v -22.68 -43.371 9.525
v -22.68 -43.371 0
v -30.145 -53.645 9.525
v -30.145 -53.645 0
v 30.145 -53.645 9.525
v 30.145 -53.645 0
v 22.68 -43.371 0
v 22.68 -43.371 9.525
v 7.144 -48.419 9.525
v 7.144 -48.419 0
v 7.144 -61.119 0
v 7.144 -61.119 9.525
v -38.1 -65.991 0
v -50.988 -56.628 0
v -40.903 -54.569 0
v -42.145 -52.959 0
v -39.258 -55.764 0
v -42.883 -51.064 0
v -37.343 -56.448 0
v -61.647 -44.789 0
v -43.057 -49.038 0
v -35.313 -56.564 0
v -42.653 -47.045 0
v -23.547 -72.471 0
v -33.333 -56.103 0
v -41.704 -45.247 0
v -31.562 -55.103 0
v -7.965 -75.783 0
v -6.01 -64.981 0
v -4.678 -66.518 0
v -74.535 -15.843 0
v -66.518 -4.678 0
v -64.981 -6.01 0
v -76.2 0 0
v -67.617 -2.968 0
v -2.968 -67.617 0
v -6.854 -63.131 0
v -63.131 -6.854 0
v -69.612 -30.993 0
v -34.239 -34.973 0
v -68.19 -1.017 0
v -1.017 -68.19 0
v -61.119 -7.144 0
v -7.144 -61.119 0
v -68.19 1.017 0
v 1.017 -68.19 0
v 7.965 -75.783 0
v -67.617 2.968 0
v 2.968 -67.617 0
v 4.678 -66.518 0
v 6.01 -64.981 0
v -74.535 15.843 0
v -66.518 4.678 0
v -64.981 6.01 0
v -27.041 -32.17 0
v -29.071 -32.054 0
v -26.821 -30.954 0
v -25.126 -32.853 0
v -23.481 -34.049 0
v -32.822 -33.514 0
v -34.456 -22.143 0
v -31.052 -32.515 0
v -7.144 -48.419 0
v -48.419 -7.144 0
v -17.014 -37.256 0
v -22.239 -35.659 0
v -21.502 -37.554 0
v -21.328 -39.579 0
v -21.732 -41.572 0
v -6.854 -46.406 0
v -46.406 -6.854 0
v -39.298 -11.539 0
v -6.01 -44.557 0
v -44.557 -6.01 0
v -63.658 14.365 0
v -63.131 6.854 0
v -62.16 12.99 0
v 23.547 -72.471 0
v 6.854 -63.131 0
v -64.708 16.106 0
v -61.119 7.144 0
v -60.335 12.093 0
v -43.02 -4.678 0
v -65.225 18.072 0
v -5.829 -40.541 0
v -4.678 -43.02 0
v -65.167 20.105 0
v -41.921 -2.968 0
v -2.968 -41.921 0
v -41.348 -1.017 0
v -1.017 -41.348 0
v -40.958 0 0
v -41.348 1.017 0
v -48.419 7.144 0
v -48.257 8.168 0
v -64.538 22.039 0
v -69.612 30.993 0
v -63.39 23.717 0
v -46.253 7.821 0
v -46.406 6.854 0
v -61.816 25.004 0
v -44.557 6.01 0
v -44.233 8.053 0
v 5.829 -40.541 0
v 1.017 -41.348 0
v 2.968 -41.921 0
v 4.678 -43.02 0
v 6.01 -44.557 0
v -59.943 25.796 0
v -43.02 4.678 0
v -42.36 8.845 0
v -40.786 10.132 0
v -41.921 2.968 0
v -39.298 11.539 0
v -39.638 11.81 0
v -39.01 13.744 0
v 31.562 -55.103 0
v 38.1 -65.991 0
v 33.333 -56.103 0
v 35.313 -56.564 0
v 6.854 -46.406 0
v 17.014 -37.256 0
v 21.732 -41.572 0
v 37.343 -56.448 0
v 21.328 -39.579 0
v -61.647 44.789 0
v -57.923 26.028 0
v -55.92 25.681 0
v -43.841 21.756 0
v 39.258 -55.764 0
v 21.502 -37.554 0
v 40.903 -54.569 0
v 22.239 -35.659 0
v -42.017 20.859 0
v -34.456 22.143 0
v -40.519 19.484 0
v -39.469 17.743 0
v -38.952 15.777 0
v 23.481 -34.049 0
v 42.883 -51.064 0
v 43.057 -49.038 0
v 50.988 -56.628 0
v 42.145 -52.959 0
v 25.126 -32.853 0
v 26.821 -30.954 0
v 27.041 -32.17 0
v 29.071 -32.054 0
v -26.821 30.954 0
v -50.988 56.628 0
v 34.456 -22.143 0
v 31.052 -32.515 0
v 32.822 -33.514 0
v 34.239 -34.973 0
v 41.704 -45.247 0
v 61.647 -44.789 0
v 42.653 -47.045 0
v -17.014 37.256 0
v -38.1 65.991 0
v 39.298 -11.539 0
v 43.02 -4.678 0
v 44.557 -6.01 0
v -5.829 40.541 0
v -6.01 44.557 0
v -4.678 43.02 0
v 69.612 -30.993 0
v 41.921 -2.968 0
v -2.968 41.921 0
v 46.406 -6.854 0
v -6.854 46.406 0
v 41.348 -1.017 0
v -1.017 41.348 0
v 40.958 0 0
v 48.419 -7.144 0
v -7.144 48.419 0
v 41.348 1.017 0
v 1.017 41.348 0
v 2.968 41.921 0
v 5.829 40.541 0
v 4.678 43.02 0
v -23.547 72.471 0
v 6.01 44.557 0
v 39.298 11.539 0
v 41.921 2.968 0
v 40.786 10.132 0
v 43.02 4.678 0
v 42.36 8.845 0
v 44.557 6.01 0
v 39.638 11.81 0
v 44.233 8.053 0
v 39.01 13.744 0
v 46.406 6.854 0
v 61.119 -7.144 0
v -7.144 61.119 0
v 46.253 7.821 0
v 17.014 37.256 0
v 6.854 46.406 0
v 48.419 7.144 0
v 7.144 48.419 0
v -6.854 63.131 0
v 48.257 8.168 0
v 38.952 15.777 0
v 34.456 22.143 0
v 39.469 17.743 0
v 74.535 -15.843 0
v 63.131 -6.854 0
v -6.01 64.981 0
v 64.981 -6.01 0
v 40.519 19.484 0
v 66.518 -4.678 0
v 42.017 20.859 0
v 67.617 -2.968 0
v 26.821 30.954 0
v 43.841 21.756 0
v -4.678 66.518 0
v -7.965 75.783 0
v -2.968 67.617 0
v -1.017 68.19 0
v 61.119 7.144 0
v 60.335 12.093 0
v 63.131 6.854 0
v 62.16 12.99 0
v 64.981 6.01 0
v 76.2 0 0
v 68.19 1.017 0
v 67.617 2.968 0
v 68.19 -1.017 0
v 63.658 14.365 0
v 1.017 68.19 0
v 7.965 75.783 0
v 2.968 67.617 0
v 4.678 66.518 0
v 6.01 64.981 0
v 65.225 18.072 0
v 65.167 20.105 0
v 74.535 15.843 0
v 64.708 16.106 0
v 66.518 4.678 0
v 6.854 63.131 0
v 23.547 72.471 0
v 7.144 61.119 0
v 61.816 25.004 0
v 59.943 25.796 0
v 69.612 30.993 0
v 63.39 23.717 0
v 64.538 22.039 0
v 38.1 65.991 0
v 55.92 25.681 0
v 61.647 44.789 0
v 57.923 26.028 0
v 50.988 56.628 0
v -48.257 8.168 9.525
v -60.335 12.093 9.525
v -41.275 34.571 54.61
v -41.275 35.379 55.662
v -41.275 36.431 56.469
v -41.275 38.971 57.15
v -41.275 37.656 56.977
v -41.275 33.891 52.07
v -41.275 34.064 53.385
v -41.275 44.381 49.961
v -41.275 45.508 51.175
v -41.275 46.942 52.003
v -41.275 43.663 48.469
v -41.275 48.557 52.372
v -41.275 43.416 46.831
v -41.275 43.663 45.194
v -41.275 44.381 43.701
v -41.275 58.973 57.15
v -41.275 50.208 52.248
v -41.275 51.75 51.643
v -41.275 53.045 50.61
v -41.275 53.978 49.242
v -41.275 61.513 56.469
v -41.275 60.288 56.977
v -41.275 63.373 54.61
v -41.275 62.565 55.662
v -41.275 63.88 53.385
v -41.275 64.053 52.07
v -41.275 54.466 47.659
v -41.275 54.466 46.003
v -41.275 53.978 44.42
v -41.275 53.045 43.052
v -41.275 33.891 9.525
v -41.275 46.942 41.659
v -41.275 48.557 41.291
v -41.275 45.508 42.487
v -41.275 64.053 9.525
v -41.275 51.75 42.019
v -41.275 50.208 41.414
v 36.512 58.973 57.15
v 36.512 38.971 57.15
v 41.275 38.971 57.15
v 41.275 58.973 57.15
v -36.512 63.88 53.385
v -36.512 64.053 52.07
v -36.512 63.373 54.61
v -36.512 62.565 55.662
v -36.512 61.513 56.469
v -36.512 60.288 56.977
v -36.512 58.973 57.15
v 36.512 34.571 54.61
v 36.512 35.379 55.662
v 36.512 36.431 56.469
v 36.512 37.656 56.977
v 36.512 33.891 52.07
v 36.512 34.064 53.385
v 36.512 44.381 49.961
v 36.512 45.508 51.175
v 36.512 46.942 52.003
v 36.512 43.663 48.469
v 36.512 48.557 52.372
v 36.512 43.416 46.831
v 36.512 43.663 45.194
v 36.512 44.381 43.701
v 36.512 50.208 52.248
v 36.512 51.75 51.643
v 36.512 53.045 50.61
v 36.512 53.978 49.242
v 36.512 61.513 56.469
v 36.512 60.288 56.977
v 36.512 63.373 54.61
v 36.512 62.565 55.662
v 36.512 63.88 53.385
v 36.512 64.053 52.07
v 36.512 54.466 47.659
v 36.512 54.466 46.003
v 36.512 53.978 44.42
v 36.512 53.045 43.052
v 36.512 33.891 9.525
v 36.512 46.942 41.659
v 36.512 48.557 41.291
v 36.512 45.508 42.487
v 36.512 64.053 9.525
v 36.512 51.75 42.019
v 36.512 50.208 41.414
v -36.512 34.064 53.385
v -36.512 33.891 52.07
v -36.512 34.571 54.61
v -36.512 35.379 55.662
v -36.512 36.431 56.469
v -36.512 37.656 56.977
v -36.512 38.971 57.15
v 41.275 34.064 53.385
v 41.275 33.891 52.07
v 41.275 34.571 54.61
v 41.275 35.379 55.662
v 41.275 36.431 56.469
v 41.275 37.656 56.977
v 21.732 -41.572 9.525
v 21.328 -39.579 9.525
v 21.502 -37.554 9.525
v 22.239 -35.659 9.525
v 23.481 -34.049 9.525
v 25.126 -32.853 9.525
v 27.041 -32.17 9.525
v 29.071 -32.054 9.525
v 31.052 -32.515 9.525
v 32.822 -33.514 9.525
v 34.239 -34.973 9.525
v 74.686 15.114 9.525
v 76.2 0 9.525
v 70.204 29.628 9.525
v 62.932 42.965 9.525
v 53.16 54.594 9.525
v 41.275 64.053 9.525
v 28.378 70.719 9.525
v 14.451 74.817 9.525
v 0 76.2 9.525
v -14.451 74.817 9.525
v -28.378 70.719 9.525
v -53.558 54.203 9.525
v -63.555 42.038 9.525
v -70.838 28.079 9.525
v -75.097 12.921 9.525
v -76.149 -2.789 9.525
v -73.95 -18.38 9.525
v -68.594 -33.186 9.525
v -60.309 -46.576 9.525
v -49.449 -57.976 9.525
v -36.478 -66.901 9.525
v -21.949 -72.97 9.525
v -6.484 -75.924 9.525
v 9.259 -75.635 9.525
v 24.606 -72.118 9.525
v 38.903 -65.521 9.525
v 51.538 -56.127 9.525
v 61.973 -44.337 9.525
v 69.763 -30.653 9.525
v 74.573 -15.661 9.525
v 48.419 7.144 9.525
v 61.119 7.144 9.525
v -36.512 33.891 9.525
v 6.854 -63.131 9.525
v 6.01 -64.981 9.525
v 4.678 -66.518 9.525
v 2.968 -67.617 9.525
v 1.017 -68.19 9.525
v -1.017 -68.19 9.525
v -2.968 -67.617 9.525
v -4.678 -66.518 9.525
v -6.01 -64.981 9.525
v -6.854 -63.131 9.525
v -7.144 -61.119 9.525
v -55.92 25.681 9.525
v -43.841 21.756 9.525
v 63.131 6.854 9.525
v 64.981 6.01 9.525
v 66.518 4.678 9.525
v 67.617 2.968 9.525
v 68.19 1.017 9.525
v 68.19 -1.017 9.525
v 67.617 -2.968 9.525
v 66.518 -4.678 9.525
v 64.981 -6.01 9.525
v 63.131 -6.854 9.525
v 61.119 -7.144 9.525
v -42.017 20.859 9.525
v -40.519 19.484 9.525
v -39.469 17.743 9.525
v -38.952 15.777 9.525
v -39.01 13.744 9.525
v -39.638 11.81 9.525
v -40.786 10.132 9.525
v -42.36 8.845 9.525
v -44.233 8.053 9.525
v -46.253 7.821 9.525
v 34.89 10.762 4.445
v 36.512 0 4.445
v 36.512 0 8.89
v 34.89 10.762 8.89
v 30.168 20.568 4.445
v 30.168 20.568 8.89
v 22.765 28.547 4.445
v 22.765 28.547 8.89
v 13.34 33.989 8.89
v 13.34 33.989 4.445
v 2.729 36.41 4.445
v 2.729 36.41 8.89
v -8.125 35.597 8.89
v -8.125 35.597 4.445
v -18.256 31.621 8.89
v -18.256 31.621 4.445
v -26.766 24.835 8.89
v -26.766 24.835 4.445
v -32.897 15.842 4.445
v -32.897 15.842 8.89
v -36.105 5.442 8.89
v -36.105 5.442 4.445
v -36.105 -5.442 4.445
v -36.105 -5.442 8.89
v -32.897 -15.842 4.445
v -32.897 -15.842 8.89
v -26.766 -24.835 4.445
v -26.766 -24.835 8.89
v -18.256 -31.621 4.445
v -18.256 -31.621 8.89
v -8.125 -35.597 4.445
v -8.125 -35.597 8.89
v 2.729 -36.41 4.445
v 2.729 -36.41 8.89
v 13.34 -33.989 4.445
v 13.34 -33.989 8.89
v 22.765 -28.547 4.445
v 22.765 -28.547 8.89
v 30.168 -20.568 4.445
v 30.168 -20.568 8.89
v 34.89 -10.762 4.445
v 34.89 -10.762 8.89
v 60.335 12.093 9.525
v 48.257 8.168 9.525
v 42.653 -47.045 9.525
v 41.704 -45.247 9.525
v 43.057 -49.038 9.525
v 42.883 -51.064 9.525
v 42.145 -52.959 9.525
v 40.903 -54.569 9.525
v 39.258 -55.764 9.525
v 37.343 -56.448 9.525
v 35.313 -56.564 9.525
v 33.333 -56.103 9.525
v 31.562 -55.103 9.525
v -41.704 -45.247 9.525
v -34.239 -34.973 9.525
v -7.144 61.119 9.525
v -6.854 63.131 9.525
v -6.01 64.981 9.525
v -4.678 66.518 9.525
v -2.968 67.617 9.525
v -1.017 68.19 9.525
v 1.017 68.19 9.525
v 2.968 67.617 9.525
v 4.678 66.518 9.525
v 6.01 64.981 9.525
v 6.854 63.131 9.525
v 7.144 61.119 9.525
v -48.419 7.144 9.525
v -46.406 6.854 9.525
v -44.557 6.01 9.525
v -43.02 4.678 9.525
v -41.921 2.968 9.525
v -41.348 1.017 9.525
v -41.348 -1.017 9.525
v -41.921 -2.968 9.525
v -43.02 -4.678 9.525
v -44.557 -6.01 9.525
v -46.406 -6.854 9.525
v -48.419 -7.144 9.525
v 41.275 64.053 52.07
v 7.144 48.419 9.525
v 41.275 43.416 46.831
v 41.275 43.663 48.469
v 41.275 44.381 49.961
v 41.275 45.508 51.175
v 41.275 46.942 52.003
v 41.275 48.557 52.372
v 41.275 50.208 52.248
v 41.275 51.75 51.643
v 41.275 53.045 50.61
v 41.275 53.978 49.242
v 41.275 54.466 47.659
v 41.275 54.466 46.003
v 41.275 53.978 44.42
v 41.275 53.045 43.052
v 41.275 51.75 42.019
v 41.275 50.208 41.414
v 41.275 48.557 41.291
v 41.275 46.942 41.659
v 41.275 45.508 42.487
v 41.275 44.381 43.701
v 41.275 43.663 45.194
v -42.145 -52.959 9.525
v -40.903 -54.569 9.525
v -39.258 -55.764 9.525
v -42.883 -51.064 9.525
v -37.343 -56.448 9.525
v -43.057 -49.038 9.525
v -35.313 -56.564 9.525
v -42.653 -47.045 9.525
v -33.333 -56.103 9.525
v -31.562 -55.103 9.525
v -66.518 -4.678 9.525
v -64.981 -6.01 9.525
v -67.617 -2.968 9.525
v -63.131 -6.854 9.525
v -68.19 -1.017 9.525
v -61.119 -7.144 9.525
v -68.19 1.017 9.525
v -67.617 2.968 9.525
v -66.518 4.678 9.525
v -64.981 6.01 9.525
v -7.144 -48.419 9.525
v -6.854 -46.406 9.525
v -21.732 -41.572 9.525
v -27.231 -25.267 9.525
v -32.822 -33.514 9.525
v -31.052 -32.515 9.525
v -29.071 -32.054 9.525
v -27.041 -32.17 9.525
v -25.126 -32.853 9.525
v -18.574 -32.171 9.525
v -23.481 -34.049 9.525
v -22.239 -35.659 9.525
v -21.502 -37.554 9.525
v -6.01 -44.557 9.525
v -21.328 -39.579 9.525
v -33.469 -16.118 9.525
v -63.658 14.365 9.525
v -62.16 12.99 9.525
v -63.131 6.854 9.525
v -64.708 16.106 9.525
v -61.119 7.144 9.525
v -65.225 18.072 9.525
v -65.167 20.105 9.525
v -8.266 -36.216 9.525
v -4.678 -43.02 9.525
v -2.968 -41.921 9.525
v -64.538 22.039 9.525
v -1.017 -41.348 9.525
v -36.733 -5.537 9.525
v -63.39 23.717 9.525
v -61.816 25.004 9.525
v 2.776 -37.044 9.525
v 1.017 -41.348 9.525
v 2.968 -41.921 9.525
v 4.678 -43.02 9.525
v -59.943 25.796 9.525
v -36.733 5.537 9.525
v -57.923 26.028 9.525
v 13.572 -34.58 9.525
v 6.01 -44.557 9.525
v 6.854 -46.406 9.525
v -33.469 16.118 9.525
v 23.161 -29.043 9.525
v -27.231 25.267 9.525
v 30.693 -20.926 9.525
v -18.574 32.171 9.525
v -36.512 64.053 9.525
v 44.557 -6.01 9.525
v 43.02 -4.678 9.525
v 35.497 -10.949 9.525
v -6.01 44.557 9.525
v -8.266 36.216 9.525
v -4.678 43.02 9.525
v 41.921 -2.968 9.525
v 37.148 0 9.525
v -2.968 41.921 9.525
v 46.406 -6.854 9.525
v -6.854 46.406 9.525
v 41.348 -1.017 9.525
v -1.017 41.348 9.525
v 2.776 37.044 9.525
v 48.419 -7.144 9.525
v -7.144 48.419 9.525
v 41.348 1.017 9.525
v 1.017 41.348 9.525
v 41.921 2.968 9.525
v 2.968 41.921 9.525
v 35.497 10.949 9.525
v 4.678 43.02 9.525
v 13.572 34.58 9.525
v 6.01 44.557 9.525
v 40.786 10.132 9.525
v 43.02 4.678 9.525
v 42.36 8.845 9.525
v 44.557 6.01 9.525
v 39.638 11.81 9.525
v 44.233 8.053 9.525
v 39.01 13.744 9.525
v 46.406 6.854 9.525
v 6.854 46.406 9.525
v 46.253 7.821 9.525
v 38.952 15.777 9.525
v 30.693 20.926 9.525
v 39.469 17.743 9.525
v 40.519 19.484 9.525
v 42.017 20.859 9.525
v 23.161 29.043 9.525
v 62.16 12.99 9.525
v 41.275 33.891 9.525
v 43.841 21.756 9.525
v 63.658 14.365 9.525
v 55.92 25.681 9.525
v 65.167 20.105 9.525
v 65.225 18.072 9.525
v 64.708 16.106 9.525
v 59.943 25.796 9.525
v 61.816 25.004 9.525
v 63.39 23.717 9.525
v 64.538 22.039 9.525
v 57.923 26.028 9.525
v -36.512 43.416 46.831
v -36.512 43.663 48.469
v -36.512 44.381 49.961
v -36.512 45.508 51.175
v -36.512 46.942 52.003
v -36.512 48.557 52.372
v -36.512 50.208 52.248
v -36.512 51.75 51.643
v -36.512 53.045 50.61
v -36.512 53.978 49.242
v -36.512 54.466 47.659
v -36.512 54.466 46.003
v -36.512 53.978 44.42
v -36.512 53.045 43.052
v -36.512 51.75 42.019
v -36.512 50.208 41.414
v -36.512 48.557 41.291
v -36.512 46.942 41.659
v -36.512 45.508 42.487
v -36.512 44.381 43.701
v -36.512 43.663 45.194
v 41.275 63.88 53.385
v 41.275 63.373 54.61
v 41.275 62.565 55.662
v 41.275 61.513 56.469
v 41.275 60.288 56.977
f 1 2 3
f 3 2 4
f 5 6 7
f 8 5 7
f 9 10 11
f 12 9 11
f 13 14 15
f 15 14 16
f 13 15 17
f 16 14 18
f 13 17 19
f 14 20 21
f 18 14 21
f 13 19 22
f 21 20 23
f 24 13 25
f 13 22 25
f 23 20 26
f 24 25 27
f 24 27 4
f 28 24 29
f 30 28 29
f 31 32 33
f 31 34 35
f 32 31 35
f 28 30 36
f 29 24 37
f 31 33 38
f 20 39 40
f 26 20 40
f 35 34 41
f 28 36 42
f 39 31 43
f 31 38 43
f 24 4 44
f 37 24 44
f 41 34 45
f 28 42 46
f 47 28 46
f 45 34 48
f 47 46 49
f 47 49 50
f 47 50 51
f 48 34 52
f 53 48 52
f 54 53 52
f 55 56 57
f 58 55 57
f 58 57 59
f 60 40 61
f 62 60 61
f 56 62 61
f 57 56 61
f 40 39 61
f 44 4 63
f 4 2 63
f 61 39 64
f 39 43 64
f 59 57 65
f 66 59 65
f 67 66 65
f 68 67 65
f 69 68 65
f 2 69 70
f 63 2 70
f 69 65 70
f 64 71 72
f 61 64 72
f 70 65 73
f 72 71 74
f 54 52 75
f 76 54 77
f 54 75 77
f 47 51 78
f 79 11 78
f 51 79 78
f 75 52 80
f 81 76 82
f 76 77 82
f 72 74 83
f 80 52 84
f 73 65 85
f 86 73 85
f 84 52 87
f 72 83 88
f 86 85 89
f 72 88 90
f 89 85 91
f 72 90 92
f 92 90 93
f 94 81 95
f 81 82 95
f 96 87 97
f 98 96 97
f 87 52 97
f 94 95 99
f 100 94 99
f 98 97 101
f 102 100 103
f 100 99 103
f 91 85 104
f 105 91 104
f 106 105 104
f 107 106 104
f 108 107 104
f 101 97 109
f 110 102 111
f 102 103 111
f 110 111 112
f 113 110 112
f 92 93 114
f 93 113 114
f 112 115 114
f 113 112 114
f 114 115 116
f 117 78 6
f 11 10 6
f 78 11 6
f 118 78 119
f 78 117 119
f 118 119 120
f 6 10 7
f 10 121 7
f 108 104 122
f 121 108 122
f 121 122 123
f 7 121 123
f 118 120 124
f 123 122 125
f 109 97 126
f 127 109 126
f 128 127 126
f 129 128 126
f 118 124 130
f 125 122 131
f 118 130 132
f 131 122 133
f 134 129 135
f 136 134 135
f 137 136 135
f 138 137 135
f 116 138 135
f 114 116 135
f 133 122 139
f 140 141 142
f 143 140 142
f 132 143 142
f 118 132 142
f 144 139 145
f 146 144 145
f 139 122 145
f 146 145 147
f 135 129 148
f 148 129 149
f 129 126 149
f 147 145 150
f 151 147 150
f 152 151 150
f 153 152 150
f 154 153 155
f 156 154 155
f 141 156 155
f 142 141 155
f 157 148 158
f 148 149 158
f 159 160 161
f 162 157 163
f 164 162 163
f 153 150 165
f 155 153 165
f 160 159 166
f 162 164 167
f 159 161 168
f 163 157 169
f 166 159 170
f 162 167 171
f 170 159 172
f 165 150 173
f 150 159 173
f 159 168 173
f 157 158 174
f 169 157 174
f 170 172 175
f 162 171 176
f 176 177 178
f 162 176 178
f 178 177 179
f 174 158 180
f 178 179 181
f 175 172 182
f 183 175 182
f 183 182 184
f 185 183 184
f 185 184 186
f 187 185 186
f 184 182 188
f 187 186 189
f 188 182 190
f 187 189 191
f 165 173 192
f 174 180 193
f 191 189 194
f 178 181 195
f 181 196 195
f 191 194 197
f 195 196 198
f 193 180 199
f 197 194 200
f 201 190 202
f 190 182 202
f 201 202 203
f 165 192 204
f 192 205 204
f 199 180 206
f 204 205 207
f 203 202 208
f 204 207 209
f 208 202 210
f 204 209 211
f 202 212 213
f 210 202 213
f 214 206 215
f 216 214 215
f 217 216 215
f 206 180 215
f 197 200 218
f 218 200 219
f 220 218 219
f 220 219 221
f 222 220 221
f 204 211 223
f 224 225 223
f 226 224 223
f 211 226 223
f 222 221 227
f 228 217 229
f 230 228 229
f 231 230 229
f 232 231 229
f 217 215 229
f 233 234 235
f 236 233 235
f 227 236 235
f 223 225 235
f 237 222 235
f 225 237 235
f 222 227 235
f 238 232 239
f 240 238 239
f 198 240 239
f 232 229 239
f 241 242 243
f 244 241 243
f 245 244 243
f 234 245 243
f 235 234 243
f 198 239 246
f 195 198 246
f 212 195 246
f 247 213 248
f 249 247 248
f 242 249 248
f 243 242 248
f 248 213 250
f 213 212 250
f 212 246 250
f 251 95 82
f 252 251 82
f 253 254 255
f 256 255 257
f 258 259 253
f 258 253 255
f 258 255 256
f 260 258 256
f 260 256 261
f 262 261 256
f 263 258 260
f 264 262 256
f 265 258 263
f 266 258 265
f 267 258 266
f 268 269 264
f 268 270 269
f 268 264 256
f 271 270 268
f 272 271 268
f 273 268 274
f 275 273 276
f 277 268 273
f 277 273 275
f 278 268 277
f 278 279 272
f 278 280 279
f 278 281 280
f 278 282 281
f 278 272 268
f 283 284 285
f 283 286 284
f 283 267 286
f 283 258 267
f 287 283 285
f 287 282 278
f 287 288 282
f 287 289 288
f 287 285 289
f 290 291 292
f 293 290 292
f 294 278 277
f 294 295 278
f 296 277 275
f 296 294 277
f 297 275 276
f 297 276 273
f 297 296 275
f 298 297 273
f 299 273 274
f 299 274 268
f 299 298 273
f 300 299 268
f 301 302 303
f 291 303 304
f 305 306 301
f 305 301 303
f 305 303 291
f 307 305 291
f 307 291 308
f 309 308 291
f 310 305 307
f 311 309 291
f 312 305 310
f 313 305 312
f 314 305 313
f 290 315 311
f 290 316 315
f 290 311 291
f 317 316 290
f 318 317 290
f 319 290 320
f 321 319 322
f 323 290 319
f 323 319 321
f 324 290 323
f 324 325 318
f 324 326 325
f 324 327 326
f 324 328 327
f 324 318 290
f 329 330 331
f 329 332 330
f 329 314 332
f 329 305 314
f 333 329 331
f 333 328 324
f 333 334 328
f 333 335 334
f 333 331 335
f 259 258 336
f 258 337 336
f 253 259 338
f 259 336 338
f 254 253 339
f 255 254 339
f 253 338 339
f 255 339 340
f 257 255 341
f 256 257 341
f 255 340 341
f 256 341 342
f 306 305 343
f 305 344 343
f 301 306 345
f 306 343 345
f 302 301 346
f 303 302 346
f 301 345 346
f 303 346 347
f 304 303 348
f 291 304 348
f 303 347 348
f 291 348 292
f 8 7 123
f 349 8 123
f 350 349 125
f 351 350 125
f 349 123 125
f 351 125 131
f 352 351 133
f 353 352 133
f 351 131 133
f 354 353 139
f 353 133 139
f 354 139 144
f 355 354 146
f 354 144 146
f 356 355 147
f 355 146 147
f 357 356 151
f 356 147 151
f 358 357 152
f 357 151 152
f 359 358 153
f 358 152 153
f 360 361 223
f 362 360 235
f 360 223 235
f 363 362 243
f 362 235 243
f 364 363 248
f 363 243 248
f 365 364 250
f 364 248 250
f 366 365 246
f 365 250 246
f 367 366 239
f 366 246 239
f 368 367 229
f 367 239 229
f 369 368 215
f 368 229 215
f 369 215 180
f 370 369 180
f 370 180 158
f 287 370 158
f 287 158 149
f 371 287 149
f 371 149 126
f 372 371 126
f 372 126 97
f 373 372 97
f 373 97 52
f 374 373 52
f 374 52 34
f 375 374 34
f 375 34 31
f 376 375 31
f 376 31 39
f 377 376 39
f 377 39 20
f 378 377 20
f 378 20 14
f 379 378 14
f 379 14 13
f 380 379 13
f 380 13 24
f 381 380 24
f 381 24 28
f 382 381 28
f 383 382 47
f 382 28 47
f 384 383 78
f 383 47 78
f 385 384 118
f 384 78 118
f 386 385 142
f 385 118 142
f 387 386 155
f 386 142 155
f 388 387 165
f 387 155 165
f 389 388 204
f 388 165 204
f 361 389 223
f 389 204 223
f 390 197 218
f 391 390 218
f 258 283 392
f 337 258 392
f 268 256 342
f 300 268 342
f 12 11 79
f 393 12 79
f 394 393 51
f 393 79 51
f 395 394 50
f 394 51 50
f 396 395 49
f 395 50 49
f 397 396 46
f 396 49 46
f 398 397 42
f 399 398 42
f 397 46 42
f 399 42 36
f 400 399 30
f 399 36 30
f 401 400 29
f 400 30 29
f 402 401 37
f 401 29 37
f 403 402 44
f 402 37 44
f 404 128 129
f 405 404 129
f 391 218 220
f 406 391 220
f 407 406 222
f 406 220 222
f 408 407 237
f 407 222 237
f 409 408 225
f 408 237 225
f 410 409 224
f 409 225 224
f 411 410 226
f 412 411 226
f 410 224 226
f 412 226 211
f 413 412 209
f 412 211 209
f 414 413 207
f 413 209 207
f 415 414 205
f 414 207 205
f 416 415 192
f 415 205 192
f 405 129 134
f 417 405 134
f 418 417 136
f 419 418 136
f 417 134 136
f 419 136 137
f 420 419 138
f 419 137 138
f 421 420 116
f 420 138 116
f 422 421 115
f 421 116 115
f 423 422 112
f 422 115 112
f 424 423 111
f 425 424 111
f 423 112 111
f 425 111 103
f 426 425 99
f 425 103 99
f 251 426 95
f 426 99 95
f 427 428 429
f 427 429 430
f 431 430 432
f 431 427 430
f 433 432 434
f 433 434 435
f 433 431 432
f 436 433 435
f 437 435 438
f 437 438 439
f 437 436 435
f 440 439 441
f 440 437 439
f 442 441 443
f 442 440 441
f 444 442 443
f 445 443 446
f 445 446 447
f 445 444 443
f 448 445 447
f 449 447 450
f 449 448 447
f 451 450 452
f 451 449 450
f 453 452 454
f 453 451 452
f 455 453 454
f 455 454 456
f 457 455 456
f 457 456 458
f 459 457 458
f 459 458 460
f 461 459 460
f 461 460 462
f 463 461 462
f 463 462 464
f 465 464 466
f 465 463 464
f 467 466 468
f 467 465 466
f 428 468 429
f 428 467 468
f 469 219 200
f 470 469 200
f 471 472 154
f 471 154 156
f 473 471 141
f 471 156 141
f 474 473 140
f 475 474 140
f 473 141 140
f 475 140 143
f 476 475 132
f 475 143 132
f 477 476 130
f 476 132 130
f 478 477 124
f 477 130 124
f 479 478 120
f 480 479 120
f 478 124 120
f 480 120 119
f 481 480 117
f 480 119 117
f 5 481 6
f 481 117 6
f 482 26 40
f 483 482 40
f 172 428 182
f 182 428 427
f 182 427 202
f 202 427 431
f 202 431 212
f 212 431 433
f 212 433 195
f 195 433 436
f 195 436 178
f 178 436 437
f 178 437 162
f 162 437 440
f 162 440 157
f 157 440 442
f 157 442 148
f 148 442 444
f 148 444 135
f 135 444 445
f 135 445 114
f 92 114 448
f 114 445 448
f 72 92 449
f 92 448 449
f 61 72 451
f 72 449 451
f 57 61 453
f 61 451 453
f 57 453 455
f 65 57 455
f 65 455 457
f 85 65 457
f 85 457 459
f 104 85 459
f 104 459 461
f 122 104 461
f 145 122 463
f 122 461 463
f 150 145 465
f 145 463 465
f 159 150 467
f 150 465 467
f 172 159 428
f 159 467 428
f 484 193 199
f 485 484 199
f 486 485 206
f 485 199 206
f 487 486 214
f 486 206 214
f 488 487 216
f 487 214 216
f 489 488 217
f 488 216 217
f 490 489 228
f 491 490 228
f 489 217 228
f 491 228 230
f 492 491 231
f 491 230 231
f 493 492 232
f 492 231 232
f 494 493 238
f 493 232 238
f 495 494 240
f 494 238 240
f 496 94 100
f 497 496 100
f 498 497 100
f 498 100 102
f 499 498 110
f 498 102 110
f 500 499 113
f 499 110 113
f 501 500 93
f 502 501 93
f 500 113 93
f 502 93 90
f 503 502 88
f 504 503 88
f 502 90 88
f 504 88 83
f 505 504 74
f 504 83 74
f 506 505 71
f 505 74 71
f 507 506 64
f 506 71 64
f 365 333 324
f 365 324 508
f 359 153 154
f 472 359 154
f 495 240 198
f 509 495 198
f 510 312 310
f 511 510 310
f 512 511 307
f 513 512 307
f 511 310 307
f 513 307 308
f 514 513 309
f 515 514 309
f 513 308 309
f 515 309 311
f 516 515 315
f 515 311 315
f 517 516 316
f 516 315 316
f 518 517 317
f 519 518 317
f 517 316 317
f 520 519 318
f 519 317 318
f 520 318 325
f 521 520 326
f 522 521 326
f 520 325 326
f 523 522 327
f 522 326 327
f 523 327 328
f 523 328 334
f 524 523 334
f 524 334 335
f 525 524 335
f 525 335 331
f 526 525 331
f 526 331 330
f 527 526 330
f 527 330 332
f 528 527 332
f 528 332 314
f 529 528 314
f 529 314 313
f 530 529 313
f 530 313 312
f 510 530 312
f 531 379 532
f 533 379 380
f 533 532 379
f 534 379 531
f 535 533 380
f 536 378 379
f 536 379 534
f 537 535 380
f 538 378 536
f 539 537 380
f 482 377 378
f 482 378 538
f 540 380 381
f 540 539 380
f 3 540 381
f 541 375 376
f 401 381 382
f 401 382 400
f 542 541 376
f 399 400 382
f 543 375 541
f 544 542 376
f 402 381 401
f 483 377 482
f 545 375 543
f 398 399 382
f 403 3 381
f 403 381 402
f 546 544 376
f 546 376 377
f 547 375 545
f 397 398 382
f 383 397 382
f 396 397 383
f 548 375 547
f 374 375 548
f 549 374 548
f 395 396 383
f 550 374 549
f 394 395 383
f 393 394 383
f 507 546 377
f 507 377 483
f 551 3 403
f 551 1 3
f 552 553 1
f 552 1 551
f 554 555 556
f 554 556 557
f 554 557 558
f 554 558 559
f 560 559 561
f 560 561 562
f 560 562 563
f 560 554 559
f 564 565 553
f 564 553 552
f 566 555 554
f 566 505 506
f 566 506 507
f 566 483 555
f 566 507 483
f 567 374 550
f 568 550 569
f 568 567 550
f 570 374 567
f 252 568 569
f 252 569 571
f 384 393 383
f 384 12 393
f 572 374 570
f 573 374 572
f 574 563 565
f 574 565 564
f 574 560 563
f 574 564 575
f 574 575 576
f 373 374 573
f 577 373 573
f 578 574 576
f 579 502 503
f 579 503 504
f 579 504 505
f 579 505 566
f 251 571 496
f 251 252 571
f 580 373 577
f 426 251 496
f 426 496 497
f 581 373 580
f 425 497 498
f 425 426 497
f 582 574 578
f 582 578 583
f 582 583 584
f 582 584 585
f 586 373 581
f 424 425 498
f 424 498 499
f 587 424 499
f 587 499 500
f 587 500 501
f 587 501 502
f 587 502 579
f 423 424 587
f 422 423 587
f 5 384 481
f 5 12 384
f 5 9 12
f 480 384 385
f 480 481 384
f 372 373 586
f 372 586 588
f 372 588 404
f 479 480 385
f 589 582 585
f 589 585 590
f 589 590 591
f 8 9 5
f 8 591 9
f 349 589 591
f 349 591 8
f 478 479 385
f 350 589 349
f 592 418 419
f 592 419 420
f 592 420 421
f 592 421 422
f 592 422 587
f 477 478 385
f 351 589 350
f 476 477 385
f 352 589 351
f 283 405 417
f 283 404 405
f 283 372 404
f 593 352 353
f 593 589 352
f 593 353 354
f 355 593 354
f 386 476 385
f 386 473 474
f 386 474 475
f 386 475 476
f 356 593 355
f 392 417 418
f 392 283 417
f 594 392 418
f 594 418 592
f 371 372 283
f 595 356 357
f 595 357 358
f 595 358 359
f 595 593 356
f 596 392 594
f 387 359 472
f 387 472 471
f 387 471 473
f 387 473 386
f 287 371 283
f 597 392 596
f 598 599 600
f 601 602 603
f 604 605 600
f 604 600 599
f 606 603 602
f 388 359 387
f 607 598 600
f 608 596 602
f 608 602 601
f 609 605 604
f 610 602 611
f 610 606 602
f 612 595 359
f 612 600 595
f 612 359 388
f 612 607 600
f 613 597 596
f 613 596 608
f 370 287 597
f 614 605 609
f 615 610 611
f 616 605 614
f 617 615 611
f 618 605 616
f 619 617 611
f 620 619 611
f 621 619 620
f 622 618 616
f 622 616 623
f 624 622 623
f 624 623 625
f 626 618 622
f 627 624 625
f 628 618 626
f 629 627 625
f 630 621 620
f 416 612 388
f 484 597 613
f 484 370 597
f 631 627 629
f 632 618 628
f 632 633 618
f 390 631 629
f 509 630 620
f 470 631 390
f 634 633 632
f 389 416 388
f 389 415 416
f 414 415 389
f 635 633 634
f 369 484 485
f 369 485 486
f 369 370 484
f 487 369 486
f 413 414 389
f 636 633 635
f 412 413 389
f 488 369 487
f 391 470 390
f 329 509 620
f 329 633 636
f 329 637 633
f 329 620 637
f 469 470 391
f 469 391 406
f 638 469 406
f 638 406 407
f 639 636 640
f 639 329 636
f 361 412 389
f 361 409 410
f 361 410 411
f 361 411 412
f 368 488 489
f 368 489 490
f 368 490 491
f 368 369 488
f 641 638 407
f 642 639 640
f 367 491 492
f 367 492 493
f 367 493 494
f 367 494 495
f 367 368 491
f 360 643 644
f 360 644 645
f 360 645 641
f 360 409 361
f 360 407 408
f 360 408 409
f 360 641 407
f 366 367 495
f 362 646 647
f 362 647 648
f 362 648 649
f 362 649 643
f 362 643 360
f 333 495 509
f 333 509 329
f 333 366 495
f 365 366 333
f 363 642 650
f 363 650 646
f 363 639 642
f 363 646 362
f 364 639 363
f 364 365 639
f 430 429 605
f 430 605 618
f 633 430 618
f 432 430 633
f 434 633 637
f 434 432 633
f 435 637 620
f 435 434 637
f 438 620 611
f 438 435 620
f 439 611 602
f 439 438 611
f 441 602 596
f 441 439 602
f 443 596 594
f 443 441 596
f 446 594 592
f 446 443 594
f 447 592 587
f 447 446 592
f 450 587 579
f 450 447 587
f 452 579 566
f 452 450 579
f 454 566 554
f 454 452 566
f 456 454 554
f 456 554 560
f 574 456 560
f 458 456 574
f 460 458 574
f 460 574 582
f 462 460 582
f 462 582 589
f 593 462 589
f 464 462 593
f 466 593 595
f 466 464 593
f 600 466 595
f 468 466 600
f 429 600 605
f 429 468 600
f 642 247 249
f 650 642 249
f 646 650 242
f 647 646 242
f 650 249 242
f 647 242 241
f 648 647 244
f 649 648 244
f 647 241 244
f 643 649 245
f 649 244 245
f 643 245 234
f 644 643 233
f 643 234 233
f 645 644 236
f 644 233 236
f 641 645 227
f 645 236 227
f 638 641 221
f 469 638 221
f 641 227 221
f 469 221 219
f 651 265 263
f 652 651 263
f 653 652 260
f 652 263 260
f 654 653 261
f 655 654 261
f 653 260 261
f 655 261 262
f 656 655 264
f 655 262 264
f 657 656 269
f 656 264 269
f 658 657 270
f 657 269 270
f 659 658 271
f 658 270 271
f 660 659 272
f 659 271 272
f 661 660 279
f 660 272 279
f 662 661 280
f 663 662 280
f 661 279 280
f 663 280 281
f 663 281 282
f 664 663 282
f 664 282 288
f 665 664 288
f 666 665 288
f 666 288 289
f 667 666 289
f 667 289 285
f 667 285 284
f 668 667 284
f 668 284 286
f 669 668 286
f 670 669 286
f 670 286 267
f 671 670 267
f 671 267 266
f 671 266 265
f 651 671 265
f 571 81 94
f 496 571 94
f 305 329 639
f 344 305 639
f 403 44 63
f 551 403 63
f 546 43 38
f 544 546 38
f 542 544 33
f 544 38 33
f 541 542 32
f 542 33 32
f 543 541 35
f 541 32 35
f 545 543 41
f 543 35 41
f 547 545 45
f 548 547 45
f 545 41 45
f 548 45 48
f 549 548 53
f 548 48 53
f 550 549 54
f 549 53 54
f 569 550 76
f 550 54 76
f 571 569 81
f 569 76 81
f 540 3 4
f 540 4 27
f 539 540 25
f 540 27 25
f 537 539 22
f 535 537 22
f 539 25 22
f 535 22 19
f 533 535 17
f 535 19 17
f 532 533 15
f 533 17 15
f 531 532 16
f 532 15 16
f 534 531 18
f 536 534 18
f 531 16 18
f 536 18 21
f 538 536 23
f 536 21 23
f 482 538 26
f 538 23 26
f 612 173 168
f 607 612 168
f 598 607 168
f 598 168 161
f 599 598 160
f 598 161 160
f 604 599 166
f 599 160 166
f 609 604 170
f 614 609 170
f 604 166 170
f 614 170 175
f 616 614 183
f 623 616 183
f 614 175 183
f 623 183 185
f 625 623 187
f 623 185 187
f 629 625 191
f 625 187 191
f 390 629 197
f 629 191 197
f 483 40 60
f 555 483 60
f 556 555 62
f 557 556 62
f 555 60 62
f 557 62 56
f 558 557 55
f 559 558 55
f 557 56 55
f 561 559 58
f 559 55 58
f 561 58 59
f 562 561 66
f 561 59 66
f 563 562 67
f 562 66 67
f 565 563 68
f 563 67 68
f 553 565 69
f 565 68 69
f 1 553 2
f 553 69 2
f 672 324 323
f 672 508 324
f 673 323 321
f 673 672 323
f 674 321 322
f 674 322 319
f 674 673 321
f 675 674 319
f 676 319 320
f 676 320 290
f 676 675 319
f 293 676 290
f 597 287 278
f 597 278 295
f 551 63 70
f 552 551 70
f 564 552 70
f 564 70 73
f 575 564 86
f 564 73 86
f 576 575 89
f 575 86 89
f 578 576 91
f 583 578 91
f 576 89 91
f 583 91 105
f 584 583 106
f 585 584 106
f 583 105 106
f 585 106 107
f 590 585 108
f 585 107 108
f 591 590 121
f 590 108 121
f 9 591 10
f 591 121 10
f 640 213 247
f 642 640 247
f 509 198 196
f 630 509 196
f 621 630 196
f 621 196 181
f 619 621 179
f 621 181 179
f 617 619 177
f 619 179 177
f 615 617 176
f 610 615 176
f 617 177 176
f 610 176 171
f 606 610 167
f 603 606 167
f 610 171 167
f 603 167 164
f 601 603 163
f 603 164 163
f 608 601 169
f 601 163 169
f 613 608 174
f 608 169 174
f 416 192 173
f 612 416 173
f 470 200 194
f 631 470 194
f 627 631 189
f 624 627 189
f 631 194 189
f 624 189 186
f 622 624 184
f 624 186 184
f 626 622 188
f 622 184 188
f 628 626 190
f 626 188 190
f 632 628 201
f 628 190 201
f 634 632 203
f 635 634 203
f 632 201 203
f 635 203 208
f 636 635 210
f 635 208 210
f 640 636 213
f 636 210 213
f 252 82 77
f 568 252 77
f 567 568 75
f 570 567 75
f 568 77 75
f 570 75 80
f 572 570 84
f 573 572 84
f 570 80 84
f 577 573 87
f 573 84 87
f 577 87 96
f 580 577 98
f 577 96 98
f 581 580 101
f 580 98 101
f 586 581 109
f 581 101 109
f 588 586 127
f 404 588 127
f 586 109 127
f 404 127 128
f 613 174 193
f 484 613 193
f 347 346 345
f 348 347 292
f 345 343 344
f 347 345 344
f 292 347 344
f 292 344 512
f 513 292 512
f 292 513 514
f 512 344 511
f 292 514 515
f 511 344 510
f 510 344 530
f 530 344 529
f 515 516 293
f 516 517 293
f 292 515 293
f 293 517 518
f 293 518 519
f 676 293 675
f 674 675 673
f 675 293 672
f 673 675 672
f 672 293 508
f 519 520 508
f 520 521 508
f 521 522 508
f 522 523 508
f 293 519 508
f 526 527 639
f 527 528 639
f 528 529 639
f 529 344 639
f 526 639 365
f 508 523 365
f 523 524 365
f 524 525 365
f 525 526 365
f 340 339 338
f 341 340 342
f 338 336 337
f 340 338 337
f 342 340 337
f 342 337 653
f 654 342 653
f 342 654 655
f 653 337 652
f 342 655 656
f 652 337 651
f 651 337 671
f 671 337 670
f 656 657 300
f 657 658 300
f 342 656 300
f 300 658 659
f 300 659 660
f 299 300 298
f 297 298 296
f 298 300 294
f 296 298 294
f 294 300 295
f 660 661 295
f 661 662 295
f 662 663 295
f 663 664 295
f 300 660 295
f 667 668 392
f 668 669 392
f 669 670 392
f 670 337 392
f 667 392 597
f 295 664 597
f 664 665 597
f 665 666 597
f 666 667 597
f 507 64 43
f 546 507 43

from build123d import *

# Parameters (mm, degrees)
F0_R     = 76.2
F0_R_2   = 36.5125
F1_DEPTH = 9.525
F2_W     = 4.7625
F2_H     = 30.1625
F3_DEPTH = 47.625
F4_SIZE  = 4.445
F6_D     = 11.1125
F7_R     = 5.08
F8_SIZE  = 0.635


with BuildPart() as f1:
    # F0 (on Top) → F1 (new body)
    with BuildSketch(Plane.XY):
        Circle(F0_R)
        with BuildLine():
            Line((-22.680412, -43.370582), (-30.145285, -53.645098))
            ThreePointArc((-30.145285, -53.645098), (-40.123691, -55.225523), (-41.704115, -45.247117))
            Line((-41.704115, -45.247117), (-34.239242, -34.972601))
            ThreePointArc((-34.239242, -34.972601), (-24.260836, -33.392176), (-22.680412, -43.370582))
        make_face(mode=Mode.SUBTRACT)
        with BuildLine():
            ThreePointArc((7.14375, -61.11875), (0, -68.2625), (-7.14375, -61.11875))
            Line((-7.14375, -61.11875), (-7.14375, -48.41875))
            ThreePointArc((-7.14375, -48.41875), (0, -41.275), (7.14375, -48.41875))
            Line((7.14375, -48.41875), (7.14375, -61.11875))
        make_face(mode=Mode.SUBTRACT)
        with BuildLine():
            Line((34.239242, -34.972601), (41.704115, -45.247117))
            ThreePointArc((41.704115, -45.247117), (40.123691, -55.225523), (30.145285, -53.645098))
            Line((30.145285, -53.645098), (22.680412, -43.370582))
            ThreePointArc((22.680412, -43.370582), (24.260836, -33.392176), (34.239242, -34.972601))
        make_face(mode=Mode.SUBTRACT)
        with BuildLine():
            ThreePointArc((-61.11875, -7.14375), (-68.2625, 0), (-61.11875, 7.14375))
            Line((-61.11875, 7.14375), (-48.41875, 7.14375))
            ThreePointArc((-48.41875, 7.14375), (-41.275, 0), (-48.41875, -7.14375))
            Line((-48.41875, -7.14375), (-61.11875, -7.14375))
        make_face(mode=Mode.SUBTRACT)
        with BuildLine():
            Line((-48.256508, 8.168107), (-60.334926, 12.092622))
            ThreePointArc((-60.334926, 12.092622), (-64.921495, 21.094273), (-55.919845, 25.680842))
            Line((-55.919845, 25.680842), (-43.841428, 21.756327))
            ThreePointArc((-43.841428, 21.756327), (-39.254858, 12.754676), (-48.256508, 8.168107))
        make_face(mode=Mode.SUBTRACT)
        Circle(F0_R_2, mode=Mode.SUBTRACT)
        with BuildLine():
            ThreePointArc((61.11875, 7.14375), (68.2625, 0), (61.11875, -7.14375))
            Line((61.11875, -7.14375), (48.41875, -7.14375))
            ThreePointArc((48.41875, -7.14375), (41.275, 0), (48.41875, 7.14375))
            Line((48.41875, 7.14375), (61.11875, 7.14375))
        make_face(mode=Mode.SUBTRACT)
        with BuildLine():
            Line((43.841428, 21.756327), (55.919845, 25.680842))
            ThreePointArc((55.919845, 25.680842), (64.921495, 21.094273), (60.334926, 12.092622))
            Line((60.334926, 12.092622), (48.256508, 8.168107))
            ThreePointArc((48.256508, 8.168107), (39.254858, 12.754676), (43.841428, 21.756327))
        make_face(mode=Mode.SUBTRACT)
        with BuildLine():
            ThreePointArc((-7.14375, 61.11875), (0, 68.2625), (7.14375, 61.11875))
            Line((7.14375, 61.11875), (7.14375, 48.41875))
            ThreePointArc((7.14375, 48.41875), (0, 41.275), (-7.14375, 48.41875))
            Line((-7.14375, 48.41875), (-7.14375, 61.11875))
        make_face(mode=Mode.SUBTRACT)
    extrude(amount=F1_DEPTH)

    # F2 (on face) → F3 (join)
    with BuildSketch(Plane.XY.offset(9.525)):
        with Locations((38.89375, 48.971965)):
            Rectangle(F2_W, F2_H)
        with Locations((-38.89375, 48.971965)):
            Rectangle(F2_W, F2_H)
    extrude(amount=F3_DEPTH)

    # F4
    f4_edges = [f1.edges().sort_by_distance(p)[0] for p in [
        (-36.5125, 0, 0),
    ]]
    chamfer(f4_edges, length=F4_SIZE)

    # F6 (through all)
    with Locations(Plane.YZ.offset(41.275)):
        with Locations((48.971965, 46.83125)):
            Hole(F6_D / 2)

    # F7
    f7_edges = [f1.edges().sort_by_distance(p)[0] for p in [
        (38.89375, 33.890715, 57.15),
        (38.89375, 64.053215, 57.15),
        (-38.89375, 33.890715, 57.15),
        (-38.89375, 64.053215, 57.15),
    ]]
    fillet(f7_edges, radius=F7_R)

    # F8
    f8_edges = [f1.edges().sort_by_distance(p)[0] for p in [
        (-36.5125, 0, 9.525),
    ]]
    chamfer(f8_edges, length=F8_SIZE)


solid = f1.part
